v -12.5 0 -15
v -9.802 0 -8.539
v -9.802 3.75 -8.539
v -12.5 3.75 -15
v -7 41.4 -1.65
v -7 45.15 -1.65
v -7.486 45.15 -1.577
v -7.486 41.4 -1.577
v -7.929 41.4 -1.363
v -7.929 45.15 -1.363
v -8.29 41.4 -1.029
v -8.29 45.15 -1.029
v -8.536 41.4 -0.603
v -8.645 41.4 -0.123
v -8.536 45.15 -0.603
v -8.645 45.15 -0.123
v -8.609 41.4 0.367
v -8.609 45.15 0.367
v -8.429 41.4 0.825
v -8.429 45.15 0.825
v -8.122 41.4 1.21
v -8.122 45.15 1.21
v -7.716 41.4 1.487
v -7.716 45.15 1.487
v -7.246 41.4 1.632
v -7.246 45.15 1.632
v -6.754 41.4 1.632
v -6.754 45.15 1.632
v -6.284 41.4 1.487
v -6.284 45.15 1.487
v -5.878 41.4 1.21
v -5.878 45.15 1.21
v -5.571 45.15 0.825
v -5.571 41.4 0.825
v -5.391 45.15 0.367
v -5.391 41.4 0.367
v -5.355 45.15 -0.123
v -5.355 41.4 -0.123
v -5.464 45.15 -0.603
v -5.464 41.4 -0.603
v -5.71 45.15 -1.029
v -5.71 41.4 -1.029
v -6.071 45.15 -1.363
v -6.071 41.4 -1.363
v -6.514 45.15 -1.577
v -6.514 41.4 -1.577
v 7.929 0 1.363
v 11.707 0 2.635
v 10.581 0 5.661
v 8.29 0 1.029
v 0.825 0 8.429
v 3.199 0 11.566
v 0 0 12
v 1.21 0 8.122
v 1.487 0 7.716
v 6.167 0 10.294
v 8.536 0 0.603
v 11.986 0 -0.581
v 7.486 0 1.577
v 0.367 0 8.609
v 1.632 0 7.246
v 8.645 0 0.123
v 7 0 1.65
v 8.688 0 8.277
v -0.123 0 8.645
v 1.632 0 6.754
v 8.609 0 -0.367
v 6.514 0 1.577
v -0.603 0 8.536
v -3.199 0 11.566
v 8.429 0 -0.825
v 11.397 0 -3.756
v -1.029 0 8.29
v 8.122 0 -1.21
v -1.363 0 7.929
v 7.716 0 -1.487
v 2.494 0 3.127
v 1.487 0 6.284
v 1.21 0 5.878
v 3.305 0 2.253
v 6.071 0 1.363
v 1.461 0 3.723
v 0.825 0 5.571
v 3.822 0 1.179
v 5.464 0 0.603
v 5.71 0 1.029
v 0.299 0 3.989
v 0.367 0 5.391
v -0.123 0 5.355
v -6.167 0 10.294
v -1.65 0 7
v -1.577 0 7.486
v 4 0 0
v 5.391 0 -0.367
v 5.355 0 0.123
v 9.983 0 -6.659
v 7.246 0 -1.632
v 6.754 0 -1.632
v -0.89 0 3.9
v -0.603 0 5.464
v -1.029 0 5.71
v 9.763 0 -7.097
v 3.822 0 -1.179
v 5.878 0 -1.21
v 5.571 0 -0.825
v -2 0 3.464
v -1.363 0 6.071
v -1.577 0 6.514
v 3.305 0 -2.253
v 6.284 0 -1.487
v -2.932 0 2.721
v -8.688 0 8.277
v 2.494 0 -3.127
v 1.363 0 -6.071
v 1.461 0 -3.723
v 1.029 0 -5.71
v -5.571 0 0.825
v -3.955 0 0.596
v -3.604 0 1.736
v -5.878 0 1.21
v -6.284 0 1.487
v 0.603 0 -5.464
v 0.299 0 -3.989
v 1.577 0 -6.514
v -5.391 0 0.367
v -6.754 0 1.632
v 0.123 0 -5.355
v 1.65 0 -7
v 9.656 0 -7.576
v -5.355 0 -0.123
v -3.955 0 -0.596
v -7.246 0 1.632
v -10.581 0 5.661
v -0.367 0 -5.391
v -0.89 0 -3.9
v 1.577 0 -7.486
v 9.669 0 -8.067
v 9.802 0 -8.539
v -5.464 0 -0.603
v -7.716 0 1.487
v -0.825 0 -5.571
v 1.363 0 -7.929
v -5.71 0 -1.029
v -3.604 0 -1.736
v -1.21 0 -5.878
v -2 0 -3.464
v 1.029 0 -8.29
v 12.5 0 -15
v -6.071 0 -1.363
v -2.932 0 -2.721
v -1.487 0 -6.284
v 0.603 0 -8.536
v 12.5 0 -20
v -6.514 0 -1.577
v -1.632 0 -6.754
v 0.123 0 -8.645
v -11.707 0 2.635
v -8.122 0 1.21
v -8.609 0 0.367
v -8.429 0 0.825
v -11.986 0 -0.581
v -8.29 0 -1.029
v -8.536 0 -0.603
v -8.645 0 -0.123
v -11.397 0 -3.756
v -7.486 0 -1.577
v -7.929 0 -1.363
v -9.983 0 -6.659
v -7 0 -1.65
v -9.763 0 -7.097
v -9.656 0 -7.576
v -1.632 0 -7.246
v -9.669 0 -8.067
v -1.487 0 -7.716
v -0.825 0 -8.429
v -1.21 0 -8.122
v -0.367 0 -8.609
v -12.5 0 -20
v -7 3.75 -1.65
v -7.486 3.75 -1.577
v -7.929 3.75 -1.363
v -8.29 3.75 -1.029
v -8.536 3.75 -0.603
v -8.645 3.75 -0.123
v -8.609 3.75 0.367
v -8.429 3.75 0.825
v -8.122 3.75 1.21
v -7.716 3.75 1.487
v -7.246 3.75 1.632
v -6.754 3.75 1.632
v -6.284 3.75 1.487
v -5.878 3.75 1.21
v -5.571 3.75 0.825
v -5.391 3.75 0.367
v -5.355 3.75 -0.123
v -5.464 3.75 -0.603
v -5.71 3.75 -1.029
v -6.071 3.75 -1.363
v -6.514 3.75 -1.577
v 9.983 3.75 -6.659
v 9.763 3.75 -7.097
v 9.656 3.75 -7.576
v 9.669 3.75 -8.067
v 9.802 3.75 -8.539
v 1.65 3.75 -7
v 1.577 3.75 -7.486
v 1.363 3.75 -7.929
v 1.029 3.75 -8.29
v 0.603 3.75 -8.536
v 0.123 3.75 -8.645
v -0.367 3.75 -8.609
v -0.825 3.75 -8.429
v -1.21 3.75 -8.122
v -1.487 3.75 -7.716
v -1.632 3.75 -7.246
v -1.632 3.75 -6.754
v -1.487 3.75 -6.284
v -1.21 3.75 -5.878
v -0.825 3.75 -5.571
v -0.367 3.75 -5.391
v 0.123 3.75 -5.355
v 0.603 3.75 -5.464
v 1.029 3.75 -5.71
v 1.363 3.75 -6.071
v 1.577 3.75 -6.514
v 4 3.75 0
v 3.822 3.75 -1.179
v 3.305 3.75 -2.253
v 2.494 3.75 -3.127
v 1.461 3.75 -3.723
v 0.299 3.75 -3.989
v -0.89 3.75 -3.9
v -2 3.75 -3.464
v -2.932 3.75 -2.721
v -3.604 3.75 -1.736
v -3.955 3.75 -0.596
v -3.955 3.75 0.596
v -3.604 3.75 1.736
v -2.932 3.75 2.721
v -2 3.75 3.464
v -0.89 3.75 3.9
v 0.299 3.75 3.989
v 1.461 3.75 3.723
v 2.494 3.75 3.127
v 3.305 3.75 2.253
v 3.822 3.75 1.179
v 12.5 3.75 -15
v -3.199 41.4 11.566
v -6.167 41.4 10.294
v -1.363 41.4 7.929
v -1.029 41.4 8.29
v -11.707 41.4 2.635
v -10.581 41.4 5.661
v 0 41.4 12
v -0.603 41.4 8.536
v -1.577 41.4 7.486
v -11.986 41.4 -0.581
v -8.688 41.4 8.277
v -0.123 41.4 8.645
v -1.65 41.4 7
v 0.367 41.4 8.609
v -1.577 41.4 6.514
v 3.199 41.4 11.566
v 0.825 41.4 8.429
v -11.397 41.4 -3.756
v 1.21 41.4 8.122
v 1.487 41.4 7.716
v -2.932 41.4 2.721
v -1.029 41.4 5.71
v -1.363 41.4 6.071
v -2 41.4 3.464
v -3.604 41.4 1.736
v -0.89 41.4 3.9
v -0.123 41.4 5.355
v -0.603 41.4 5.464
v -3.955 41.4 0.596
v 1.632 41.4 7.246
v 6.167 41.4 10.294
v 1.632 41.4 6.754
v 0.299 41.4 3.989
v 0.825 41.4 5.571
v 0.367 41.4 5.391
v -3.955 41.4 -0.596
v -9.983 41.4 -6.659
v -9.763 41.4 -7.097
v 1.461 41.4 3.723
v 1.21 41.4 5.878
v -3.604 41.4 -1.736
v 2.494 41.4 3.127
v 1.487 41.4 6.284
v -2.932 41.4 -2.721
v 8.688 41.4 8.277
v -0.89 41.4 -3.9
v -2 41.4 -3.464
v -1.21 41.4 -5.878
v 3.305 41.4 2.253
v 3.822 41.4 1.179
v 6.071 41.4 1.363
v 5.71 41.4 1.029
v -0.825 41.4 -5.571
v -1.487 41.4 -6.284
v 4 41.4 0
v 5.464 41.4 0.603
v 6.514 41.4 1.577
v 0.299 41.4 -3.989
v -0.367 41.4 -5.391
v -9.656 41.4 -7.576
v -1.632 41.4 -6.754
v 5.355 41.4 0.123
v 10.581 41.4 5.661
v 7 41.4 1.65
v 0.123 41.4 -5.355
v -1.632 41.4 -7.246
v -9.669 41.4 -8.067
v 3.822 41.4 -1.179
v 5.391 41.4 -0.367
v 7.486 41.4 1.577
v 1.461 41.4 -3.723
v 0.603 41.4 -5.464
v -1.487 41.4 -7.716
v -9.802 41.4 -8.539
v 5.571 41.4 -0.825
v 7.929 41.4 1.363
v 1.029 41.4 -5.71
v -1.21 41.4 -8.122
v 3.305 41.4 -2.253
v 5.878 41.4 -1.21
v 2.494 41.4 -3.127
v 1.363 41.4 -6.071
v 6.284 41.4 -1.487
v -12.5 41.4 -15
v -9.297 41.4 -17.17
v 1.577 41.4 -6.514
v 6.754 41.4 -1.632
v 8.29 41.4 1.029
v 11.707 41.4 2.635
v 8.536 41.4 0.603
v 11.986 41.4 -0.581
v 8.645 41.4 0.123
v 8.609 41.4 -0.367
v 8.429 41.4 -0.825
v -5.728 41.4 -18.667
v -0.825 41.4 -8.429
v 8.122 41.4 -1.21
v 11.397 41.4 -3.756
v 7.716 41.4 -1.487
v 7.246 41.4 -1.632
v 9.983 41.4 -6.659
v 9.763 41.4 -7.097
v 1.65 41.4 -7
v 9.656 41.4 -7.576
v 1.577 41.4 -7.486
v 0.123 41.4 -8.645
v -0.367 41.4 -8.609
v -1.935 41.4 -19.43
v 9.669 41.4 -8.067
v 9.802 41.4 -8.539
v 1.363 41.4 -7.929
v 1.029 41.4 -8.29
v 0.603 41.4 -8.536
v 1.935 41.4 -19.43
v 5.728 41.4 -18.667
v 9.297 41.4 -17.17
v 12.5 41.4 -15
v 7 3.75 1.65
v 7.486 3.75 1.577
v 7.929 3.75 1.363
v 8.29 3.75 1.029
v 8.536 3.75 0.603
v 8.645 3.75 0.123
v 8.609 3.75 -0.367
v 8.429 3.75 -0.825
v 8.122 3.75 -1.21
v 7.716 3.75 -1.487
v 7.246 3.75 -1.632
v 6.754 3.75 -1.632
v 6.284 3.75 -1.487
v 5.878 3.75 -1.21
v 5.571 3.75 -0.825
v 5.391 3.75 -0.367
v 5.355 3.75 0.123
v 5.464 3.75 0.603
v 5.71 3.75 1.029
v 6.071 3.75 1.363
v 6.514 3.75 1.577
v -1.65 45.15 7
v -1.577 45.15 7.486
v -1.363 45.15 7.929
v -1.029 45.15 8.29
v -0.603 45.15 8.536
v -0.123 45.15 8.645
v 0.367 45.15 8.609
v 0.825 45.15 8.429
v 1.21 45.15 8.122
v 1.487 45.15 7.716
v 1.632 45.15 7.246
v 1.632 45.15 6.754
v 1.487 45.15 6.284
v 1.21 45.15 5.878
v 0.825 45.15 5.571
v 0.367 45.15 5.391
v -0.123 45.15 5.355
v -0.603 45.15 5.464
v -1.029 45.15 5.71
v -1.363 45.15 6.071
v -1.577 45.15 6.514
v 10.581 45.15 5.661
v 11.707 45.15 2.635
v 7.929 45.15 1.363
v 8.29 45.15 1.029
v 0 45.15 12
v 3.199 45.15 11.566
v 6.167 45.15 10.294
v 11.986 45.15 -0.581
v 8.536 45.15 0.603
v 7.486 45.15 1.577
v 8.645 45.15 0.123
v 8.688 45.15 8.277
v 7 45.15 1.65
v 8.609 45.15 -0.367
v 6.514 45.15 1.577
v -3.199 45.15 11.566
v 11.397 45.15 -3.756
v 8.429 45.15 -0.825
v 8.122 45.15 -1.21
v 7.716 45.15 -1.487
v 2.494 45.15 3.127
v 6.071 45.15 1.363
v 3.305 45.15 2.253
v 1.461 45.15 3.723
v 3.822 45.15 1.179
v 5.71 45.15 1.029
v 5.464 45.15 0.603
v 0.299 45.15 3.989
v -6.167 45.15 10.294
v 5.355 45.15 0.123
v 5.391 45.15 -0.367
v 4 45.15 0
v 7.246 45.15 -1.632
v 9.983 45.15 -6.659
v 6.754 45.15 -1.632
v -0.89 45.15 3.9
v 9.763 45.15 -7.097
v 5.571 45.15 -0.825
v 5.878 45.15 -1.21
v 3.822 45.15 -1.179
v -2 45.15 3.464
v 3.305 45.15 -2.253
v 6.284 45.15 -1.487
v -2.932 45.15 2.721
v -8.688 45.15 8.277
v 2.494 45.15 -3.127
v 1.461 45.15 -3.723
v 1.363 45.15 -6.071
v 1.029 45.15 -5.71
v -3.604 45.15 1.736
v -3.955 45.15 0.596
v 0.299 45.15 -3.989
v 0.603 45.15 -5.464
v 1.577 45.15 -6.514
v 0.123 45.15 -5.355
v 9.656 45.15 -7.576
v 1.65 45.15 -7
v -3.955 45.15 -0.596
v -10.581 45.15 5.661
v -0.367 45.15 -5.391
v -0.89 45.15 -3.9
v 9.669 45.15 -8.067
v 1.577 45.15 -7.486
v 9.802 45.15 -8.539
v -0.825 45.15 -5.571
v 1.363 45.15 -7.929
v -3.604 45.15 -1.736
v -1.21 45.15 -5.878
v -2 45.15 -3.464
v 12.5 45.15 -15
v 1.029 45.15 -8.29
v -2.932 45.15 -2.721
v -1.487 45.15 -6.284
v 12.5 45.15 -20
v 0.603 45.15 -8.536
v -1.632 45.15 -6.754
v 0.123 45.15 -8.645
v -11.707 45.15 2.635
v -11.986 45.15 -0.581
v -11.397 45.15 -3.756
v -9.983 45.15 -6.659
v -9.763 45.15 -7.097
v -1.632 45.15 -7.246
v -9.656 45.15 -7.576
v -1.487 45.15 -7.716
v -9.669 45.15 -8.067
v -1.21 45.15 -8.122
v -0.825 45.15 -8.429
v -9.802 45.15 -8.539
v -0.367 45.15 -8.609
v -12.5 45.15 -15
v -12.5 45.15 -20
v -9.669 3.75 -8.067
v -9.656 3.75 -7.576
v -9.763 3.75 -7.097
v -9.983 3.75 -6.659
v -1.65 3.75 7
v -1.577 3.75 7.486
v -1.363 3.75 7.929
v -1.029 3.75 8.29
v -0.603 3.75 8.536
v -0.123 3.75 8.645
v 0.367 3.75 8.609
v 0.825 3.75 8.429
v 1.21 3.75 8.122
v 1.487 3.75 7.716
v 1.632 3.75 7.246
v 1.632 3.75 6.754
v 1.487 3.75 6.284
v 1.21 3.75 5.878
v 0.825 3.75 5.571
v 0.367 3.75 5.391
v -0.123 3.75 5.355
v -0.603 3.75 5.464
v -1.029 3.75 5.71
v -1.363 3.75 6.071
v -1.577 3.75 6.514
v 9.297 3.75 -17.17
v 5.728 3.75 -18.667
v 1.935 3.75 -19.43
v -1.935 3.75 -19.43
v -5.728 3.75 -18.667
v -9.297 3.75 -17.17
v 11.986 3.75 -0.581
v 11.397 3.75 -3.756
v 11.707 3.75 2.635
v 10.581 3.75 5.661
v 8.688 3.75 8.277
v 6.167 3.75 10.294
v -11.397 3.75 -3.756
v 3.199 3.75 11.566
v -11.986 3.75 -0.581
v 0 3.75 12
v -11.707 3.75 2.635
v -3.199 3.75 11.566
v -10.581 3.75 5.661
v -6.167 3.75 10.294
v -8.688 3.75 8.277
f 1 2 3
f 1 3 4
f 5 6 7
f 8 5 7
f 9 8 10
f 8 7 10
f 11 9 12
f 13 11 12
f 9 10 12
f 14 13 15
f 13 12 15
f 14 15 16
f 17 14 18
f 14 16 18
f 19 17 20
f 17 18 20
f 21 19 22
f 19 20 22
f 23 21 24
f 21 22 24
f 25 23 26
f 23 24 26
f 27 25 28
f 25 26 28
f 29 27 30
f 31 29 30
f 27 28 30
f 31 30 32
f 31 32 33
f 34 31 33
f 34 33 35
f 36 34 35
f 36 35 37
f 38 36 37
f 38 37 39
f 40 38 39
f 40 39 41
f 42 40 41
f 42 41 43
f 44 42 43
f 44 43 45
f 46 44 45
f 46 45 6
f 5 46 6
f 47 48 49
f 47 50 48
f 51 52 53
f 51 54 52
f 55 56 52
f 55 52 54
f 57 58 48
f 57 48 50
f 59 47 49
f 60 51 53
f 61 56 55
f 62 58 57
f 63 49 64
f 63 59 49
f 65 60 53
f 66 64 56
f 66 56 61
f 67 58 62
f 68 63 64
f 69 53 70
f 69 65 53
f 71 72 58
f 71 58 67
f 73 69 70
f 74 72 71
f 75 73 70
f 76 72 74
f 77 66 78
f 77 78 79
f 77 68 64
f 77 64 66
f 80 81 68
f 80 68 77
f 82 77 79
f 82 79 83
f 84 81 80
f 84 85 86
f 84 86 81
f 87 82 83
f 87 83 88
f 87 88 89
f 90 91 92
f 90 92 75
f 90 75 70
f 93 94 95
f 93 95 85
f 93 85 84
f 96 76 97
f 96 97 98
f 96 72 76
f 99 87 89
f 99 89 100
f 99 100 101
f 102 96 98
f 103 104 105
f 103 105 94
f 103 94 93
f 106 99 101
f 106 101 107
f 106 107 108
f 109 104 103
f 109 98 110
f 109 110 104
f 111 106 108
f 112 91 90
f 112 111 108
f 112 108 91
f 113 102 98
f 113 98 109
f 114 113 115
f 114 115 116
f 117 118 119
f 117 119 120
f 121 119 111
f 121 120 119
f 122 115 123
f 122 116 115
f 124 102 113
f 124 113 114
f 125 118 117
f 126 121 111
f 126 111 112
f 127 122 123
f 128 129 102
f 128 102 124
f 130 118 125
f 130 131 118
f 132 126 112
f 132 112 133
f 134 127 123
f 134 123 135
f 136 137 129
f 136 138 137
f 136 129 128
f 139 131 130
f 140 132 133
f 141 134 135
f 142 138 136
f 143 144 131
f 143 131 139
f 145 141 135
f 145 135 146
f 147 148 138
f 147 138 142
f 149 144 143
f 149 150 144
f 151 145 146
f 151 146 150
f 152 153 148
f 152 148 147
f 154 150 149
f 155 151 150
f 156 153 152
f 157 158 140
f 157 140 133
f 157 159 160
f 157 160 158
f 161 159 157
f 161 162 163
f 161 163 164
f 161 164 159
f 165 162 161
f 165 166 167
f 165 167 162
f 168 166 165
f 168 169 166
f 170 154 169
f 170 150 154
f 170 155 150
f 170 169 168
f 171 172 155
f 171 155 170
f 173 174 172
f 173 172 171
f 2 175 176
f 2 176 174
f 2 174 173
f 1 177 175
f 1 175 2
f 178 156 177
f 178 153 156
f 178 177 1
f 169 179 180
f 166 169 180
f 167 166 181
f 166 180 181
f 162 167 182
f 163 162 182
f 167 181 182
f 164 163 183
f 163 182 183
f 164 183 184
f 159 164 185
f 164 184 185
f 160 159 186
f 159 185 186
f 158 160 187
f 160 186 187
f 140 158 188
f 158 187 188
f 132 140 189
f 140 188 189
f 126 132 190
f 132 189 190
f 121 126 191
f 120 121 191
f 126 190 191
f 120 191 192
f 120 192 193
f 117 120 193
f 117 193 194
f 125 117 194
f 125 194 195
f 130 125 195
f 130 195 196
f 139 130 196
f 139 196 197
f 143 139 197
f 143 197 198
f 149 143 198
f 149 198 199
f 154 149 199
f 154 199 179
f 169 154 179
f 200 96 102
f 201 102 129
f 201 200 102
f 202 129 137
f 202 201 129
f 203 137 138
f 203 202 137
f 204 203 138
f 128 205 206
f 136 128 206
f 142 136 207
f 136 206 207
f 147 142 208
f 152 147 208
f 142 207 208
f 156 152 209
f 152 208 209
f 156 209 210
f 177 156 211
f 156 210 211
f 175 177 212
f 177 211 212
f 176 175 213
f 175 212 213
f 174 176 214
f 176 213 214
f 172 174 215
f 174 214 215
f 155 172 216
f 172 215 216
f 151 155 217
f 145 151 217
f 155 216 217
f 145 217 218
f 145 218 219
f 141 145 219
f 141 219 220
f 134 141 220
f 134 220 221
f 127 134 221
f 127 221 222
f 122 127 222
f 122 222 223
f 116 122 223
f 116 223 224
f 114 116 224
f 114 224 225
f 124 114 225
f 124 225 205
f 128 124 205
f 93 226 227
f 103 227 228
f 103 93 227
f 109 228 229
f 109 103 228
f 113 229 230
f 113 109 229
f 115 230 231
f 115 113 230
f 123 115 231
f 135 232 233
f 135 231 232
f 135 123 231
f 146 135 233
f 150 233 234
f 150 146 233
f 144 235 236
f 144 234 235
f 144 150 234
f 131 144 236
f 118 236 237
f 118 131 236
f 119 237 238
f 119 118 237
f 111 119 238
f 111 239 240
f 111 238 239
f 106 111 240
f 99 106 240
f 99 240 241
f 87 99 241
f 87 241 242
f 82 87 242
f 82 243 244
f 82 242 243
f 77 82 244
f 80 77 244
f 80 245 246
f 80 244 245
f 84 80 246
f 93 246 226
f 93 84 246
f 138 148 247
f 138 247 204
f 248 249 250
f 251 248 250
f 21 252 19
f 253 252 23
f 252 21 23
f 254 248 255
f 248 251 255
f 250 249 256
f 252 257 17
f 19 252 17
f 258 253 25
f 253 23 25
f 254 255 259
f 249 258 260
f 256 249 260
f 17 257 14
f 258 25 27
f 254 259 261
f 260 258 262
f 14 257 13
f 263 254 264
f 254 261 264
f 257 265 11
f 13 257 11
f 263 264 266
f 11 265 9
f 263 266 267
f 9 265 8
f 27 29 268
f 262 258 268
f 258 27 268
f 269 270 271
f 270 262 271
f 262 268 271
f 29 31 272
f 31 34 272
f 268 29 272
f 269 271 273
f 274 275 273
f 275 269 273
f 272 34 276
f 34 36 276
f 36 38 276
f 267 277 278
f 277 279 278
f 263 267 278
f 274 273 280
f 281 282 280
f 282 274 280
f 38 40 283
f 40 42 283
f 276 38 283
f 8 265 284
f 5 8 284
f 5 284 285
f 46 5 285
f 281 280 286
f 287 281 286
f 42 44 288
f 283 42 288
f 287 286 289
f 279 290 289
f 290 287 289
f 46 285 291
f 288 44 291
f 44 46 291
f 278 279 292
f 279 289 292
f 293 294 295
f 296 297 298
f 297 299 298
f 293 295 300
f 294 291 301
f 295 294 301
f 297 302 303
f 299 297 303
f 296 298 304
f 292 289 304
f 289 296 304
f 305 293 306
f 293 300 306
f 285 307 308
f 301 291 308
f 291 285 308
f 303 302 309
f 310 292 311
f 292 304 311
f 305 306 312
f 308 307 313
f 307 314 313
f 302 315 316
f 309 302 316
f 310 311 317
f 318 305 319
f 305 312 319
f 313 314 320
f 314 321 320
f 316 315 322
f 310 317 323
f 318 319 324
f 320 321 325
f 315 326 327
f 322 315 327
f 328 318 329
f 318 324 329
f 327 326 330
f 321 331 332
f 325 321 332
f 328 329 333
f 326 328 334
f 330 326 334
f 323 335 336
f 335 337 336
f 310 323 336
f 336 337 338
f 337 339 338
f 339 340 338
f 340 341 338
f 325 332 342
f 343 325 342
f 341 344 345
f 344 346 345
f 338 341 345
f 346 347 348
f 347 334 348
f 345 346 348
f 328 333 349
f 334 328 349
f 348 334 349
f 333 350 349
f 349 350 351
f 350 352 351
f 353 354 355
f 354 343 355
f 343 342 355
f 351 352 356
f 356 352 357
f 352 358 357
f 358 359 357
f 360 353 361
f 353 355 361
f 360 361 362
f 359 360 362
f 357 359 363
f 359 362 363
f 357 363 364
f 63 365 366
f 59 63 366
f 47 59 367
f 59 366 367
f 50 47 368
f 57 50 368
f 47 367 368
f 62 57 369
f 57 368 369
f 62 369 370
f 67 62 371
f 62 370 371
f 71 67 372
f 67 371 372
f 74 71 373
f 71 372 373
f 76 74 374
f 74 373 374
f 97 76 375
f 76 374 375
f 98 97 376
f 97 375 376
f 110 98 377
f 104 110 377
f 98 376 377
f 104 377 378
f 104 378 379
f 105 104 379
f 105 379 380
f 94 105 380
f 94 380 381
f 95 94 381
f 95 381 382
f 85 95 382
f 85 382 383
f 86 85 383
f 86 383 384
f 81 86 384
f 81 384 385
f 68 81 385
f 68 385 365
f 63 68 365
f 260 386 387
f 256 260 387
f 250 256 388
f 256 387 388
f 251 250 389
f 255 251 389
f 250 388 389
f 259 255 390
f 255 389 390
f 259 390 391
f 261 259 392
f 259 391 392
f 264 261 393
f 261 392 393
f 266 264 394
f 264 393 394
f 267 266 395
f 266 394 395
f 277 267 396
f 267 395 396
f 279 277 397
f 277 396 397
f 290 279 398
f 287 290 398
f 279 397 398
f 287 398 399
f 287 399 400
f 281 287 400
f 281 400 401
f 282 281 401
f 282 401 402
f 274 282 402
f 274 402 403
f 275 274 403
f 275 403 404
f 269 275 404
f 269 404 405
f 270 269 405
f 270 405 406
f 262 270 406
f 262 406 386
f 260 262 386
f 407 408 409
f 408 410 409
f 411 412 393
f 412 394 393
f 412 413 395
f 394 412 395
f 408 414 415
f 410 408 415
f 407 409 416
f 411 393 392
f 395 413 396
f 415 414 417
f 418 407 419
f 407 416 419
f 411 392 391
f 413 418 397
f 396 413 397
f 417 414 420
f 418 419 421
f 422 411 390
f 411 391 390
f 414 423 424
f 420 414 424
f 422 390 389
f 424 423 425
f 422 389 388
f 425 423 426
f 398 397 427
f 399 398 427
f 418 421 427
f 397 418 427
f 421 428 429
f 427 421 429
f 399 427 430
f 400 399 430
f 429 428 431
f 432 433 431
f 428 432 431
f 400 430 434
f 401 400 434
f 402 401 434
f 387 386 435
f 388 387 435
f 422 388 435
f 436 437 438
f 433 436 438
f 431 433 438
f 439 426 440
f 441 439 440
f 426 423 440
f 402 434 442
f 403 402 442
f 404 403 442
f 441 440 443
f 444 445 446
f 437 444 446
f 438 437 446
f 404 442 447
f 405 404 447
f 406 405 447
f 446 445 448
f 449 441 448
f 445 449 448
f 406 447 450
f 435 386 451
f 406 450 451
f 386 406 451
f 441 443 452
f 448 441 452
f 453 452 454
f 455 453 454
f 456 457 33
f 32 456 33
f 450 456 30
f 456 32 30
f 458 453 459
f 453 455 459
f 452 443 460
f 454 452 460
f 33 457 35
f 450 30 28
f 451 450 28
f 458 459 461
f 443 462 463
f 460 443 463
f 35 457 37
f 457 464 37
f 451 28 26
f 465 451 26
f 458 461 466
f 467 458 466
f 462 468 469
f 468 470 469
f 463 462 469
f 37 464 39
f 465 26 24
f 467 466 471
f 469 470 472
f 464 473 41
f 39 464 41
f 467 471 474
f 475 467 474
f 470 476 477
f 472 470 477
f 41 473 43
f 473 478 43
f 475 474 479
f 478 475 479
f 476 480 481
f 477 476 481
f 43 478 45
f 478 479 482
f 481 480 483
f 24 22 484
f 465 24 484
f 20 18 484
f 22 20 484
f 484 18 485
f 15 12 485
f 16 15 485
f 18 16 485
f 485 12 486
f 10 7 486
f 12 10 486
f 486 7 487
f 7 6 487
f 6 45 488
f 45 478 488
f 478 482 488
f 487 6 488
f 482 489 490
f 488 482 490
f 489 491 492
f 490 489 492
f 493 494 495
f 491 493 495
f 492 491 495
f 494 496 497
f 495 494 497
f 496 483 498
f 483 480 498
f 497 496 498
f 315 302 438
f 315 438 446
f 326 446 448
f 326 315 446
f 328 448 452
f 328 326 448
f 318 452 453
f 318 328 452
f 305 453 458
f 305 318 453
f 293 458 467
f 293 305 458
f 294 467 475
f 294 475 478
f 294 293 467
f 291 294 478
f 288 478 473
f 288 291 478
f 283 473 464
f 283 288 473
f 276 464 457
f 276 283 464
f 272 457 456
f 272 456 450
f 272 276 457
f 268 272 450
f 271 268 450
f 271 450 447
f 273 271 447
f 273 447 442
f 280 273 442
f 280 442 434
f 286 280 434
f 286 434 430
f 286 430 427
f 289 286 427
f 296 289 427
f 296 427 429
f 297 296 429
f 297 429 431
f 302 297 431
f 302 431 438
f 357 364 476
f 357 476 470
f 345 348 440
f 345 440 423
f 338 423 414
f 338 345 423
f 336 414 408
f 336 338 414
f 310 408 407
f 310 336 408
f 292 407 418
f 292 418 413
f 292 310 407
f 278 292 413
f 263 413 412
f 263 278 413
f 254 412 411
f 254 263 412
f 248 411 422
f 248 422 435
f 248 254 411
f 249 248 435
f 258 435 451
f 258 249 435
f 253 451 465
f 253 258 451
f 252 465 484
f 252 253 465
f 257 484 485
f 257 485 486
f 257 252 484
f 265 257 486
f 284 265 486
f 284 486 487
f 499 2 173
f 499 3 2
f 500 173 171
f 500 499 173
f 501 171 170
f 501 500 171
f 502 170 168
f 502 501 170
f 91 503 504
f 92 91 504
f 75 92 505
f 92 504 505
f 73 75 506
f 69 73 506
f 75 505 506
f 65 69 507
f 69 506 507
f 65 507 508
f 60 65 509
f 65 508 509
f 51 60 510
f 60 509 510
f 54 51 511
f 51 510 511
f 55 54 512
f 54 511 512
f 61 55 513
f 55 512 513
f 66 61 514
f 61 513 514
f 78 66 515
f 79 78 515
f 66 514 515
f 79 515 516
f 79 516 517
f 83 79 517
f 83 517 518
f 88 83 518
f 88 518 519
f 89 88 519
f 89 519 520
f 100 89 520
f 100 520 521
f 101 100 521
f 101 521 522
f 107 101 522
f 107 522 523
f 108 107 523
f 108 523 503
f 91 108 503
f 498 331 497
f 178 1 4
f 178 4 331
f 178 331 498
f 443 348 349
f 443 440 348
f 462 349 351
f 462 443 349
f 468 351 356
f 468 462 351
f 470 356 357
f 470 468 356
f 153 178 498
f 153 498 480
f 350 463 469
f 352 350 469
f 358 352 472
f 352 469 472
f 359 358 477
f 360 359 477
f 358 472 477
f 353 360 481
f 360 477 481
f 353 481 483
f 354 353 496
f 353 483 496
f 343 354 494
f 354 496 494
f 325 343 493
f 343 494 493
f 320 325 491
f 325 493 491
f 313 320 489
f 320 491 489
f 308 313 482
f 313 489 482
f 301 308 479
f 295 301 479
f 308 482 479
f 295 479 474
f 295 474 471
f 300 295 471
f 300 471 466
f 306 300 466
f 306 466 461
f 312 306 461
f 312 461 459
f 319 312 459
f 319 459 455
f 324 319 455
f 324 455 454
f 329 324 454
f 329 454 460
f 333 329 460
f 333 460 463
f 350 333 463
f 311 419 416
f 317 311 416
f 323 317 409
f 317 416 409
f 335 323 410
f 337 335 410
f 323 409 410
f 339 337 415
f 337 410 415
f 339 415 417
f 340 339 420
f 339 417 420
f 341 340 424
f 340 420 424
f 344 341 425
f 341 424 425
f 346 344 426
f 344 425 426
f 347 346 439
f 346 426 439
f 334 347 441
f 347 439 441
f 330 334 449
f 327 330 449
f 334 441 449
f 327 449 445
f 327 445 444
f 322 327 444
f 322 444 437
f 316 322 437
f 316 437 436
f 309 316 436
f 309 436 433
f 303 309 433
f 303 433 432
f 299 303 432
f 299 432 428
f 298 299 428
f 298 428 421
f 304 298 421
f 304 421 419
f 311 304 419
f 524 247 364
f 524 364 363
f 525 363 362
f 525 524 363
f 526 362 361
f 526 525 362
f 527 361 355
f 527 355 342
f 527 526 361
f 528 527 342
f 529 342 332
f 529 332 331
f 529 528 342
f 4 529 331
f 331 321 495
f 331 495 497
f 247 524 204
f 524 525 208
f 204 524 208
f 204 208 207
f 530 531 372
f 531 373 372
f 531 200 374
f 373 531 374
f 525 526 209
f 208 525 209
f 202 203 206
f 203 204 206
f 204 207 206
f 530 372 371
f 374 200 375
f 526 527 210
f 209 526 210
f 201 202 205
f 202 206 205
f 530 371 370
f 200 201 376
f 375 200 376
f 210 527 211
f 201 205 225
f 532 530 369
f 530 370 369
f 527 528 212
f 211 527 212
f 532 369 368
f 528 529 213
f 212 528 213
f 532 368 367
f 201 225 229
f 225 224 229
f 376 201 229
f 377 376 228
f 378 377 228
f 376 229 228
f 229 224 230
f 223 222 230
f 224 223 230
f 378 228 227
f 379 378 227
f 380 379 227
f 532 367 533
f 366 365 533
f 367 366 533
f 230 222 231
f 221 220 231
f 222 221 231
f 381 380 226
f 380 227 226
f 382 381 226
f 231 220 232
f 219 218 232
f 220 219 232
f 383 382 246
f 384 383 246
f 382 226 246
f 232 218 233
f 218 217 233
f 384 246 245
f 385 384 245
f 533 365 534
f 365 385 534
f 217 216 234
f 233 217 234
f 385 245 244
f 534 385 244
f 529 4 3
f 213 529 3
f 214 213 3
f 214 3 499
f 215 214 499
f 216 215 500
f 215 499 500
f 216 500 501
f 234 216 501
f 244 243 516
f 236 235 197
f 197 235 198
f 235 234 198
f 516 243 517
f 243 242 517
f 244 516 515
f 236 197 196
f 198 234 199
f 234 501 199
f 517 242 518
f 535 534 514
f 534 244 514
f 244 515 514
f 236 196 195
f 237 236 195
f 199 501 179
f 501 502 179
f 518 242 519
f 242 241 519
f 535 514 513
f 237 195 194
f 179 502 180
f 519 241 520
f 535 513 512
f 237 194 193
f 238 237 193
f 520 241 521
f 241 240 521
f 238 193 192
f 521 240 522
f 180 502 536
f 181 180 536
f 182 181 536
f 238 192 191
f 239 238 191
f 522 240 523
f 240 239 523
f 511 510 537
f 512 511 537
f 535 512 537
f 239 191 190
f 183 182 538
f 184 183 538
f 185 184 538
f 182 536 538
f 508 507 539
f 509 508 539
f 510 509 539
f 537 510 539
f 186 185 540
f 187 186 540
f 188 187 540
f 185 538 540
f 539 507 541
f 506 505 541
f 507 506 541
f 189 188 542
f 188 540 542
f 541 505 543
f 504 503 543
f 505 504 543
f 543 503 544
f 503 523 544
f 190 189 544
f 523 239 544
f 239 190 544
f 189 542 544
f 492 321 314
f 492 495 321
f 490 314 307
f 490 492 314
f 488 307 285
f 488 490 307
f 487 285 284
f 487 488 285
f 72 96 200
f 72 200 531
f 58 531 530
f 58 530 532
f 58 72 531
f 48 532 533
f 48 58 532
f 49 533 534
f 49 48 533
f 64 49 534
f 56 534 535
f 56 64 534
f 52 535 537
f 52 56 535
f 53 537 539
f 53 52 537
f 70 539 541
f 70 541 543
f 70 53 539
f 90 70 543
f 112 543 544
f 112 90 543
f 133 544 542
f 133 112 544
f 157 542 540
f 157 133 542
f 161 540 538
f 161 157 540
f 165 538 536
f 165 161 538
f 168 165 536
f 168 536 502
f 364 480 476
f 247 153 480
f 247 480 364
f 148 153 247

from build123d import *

# Parameters (mm, degrees)
SKETCH1_R           = 4
BOSS_EXTRUDE1_DEPTH = 45.15
SKETCH2_W           = 40
SKETCH2_H           = 37.65
CUT_EXTRUDE1_DEPTH  = 26
SKETCH3_R           = 1.65
CUT_EXTRUDE2_DEPTH  = 46.15
CIRPATTERN1_COUNT   = 4
FILLET1_R           = 2
CUT_EXTRUDE4_DEPTH  = 37.65


with BuildPart() as part:
    # Sketch1 → Boss-Extrude1 (new body)
    with BuildSketch(Plane(origin=(0, 0, 0), x_dir=(1, 0, 0), z_dir=(0, 1, 0))):
        with BuildLine():
            Line((-12.5, 15), (-12.5, 20))
            Line((-12.5, 20), (12.5, 20))
            Line((12.5, 20), (12.5, 15))
            Line((12.5, 15), (9.367496998, 7.5))
            ThreePointArc((9.367496998, 7.5), (0, -12), (-9.367496998, 7.5))
            Line((-9.367496998, 7.5), (-12.5, 15))
        make_face()
        Circle(SKETCH1_R, mode=Mode.SUBTRACT)
    extrude(amount=BOSS_EXTRUDE1_DEPTH)

    # Sketch2 → Cut-Extrude1 (cut, through all)
    with BuildSketch(Plane.ZY.offset(12.5)):
        with Locations((5, 22.575)):
            Rectangle(SKETCH2_W, SKETCH2_H)
    extrude(amount=-CUT_EXTRUDE1_DEPTH, mode=Mode.SUBTRACT)

    # Sketch3 → Cut-Extrude2 (cut, through all)
    with BuildSketch(Plane(origin=(0, 45.15, 0), x_dir=(1, 0, 0), z_dir=(0, 1, 0))):
        with Locations((0, 7)):
            Circle(SKETCH3_R)
    cut_extrude2 = extrude(amount=-CUT_EXTRUDE2_DEPTH, mode=Mode.SUBTRACT)

    # CirPattern1: Cut-Extrude2 ×4 about axis
    cirpattern1_axis = Axis((0, 0, 0), (0, 1, 0))
    for i in range(1, CIRPATTERN1_COUNT):
        add(cut_extrude2.rotate(cirpattern1_axis, i * 360 / CIRPATTERN1_COUNT), mode=Mode.SUBTRACT)

    # Fillet1
    fillet1_edges = [part.edges().sort_by_distance(p)[0] for p in [
        (9.367496998, 43.275, -7.5),
        (-9.367496998, 43.275, -7.5),
        (9.367496998, 1.875, -7.5),
        (-9.367496998, 1.875, -7.5),
    ]]
    fillet(fillet1_edges, radius=FILLET1_R)

    # Sketch4 → Cut-Extrude4 (cut)
    with BuildSketch(Plane(origin=(0, 3.75, 0), x_dir=(1, 0, 0), z_dir=(0, 1, 0))):
        with BuildLine():
            Line((-12.5, 15), (12.5, 15))
            ThreePointArc((12.5, 15), (0, 19.52562419), (-12.5, 15))
        make_face()
    extrude(amount=CUT_EXTRUDE4_DEPTH, mode=Mode.SUBTRACT)


solid = part.part
